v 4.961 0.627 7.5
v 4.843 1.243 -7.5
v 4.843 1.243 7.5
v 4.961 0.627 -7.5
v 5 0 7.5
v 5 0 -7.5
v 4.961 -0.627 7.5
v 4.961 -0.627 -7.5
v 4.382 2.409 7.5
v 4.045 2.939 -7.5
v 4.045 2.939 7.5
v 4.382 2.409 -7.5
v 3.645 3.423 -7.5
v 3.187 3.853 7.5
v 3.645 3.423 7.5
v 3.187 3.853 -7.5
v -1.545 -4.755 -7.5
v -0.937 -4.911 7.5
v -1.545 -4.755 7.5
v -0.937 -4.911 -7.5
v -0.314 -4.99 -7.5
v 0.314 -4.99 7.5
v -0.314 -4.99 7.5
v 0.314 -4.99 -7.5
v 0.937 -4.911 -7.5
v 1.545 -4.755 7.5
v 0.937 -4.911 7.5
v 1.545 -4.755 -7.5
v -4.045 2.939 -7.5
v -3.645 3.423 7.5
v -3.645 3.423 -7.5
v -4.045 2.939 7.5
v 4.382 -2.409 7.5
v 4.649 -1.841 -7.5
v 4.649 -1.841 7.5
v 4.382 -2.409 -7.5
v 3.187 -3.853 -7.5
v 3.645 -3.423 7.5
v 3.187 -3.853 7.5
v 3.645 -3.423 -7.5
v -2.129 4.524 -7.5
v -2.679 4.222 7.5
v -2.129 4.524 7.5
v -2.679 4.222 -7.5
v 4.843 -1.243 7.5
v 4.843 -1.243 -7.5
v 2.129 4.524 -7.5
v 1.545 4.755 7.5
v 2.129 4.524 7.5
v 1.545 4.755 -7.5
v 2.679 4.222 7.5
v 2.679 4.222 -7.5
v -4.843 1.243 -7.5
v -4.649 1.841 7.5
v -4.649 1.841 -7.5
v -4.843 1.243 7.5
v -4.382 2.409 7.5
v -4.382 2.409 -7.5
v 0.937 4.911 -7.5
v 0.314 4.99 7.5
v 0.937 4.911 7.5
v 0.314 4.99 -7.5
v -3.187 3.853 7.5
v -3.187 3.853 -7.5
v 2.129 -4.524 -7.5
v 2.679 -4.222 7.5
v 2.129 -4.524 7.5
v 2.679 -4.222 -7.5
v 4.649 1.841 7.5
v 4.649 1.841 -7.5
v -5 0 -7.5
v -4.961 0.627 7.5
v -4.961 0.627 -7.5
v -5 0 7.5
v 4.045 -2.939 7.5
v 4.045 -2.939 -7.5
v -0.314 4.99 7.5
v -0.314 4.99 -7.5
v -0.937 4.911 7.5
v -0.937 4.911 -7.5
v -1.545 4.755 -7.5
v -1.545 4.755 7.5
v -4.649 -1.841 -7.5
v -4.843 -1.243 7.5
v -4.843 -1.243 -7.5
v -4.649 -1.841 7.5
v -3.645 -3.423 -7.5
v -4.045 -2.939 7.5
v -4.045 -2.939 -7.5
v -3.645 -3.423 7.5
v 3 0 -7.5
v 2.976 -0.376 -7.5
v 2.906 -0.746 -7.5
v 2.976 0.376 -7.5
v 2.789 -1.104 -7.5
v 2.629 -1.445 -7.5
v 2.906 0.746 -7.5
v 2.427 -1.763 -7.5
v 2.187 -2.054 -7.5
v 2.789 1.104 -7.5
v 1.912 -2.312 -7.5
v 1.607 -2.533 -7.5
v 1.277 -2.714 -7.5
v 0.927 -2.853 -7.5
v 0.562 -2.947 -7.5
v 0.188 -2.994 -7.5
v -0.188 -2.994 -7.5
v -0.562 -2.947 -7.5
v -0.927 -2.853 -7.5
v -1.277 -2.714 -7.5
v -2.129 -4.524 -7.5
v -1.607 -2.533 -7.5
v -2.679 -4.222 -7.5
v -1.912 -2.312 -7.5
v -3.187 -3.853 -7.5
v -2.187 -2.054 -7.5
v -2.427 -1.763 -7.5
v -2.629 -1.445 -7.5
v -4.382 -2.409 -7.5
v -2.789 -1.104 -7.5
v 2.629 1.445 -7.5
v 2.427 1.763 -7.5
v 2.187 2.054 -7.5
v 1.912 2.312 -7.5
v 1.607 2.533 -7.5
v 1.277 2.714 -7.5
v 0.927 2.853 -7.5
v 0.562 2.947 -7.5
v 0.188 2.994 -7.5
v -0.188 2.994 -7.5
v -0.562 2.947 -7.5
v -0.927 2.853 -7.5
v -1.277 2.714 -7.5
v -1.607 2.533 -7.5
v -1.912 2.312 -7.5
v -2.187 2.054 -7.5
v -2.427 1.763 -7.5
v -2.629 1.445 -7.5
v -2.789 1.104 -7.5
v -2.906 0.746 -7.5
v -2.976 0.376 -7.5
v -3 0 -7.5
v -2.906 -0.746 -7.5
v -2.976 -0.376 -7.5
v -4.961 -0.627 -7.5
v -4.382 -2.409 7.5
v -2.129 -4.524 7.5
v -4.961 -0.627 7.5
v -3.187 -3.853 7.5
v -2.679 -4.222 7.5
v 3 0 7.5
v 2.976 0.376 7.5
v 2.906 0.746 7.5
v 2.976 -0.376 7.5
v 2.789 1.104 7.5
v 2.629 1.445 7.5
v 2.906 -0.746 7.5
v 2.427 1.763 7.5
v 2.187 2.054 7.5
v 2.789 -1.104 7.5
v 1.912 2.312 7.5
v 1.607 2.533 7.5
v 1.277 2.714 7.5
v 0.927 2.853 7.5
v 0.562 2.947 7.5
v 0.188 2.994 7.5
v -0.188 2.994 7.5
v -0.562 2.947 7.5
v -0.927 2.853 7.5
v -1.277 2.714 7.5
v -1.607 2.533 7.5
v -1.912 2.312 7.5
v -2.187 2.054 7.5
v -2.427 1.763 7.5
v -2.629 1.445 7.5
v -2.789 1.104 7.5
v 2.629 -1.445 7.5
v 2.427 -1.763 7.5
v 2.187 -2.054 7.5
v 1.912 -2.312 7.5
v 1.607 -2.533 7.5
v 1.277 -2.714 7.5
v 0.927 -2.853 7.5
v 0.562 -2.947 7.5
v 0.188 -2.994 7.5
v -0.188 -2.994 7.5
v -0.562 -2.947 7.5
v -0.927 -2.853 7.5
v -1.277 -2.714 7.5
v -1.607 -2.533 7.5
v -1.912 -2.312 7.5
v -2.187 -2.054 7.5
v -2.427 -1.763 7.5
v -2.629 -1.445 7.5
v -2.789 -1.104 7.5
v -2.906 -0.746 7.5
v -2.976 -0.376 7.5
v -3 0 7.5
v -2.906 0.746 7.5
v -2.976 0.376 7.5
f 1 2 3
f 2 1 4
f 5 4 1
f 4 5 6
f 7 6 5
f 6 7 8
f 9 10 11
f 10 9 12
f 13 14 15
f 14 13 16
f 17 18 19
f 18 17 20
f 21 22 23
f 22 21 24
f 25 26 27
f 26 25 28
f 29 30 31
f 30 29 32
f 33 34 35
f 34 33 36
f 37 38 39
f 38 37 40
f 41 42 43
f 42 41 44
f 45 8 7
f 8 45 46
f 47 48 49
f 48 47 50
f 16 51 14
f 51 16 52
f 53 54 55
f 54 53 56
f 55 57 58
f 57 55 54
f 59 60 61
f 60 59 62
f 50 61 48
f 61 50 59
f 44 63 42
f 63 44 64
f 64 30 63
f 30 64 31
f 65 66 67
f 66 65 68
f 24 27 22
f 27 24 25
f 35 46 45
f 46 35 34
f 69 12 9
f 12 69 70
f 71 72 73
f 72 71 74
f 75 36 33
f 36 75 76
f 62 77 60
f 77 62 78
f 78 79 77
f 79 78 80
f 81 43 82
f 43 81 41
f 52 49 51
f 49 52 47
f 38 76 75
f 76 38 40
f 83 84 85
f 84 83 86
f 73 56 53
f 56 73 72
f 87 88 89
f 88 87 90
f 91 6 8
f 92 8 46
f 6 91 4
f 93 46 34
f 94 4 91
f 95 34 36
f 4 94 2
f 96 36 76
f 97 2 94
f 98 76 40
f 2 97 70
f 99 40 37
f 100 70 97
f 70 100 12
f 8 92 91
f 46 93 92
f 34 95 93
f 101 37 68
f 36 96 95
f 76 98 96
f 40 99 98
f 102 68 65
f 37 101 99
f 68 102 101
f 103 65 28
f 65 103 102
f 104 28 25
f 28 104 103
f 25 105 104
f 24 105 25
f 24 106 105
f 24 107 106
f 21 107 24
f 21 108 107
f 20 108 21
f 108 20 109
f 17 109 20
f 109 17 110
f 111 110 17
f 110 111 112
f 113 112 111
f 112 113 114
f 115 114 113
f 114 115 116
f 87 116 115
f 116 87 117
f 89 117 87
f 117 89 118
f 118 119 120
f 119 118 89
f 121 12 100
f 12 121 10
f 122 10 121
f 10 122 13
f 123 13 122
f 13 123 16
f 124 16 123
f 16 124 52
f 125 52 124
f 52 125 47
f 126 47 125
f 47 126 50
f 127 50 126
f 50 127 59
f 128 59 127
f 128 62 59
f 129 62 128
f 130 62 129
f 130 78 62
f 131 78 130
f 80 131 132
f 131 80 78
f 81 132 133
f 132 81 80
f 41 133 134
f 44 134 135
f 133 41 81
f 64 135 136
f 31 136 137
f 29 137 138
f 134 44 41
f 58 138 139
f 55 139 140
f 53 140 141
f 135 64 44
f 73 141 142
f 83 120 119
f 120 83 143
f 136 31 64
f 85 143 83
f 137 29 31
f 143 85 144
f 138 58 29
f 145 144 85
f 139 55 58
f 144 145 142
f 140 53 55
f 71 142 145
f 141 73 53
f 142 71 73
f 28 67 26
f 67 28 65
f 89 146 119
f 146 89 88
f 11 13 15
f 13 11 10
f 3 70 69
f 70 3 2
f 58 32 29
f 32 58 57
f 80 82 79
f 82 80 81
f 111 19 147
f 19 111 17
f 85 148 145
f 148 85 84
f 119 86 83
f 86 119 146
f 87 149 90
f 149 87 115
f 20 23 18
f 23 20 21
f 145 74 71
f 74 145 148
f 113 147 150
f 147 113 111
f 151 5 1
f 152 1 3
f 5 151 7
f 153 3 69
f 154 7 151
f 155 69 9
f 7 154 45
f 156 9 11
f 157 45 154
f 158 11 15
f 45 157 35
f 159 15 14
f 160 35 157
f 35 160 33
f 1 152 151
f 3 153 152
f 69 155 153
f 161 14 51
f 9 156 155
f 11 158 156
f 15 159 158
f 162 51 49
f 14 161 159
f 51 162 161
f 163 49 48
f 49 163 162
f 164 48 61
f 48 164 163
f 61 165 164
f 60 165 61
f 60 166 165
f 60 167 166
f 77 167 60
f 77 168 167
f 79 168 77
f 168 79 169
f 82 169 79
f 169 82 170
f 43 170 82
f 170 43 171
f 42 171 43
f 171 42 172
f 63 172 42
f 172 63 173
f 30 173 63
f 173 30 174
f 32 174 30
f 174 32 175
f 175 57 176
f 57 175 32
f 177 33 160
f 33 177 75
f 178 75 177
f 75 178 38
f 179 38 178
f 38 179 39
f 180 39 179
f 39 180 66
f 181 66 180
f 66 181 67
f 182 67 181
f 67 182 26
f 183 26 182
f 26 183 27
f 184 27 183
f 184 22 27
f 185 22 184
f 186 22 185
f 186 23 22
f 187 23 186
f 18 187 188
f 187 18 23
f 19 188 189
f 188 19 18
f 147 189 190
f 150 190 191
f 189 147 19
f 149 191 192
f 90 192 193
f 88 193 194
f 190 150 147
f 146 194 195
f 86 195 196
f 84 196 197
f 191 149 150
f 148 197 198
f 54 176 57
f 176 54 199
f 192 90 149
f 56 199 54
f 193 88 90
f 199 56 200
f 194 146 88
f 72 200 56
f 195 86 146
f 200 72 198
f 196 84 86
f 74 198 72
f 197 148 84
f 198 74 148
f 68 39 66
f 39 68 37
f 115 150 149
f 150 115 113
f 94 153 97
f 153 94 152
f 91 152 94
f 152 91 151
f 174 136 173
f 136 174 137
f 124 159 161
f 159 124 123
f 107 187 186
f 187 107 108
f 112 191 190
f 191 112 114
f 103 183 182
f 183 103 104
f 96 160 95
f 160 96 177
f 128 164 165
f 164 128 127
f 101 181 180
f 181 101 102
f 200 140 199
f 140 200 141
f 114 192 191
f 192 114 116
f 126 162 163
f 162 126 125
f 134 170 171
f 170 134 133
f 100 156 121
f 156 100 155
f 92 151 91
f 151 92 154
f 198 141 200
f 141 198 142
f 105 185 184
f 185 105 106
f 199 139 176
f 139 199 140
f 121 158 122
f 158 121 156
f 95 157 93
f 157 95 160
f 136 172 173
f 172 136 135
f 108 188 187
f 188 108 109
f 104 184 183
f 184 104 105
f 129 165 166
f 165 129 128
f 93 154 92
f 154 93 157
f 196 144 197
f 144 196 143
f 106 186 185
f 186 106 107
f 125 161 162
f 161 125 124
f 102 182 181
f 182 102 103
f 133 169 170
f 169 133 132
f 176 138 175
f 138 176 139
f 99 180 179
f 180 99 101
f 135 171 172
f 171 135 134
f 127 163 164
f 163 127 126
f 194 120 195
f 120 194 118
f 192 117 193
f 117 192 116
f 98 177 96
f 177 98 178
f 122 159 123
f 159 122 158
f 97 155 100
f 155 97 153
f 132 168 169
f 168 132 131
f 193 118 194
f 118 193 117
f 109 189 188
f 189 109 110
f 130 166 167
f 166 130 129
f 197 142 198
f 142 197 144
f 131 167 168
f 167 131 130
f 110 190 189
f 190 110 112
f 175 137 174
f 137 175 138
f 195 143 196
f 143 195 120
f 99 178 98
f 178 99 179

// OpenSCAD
$fn = 50;


difference() {
	union() {
		translate(v = [0, 0, -7.5000000000]) {
			cylinder(h = 15, r = 5.0000000000);
		}
	}
	union() {
		translate(v = [0, 0, -100.0000000000]) {
			cylinder(h = 200, r = 3.0000000000);
		}
	}
}
